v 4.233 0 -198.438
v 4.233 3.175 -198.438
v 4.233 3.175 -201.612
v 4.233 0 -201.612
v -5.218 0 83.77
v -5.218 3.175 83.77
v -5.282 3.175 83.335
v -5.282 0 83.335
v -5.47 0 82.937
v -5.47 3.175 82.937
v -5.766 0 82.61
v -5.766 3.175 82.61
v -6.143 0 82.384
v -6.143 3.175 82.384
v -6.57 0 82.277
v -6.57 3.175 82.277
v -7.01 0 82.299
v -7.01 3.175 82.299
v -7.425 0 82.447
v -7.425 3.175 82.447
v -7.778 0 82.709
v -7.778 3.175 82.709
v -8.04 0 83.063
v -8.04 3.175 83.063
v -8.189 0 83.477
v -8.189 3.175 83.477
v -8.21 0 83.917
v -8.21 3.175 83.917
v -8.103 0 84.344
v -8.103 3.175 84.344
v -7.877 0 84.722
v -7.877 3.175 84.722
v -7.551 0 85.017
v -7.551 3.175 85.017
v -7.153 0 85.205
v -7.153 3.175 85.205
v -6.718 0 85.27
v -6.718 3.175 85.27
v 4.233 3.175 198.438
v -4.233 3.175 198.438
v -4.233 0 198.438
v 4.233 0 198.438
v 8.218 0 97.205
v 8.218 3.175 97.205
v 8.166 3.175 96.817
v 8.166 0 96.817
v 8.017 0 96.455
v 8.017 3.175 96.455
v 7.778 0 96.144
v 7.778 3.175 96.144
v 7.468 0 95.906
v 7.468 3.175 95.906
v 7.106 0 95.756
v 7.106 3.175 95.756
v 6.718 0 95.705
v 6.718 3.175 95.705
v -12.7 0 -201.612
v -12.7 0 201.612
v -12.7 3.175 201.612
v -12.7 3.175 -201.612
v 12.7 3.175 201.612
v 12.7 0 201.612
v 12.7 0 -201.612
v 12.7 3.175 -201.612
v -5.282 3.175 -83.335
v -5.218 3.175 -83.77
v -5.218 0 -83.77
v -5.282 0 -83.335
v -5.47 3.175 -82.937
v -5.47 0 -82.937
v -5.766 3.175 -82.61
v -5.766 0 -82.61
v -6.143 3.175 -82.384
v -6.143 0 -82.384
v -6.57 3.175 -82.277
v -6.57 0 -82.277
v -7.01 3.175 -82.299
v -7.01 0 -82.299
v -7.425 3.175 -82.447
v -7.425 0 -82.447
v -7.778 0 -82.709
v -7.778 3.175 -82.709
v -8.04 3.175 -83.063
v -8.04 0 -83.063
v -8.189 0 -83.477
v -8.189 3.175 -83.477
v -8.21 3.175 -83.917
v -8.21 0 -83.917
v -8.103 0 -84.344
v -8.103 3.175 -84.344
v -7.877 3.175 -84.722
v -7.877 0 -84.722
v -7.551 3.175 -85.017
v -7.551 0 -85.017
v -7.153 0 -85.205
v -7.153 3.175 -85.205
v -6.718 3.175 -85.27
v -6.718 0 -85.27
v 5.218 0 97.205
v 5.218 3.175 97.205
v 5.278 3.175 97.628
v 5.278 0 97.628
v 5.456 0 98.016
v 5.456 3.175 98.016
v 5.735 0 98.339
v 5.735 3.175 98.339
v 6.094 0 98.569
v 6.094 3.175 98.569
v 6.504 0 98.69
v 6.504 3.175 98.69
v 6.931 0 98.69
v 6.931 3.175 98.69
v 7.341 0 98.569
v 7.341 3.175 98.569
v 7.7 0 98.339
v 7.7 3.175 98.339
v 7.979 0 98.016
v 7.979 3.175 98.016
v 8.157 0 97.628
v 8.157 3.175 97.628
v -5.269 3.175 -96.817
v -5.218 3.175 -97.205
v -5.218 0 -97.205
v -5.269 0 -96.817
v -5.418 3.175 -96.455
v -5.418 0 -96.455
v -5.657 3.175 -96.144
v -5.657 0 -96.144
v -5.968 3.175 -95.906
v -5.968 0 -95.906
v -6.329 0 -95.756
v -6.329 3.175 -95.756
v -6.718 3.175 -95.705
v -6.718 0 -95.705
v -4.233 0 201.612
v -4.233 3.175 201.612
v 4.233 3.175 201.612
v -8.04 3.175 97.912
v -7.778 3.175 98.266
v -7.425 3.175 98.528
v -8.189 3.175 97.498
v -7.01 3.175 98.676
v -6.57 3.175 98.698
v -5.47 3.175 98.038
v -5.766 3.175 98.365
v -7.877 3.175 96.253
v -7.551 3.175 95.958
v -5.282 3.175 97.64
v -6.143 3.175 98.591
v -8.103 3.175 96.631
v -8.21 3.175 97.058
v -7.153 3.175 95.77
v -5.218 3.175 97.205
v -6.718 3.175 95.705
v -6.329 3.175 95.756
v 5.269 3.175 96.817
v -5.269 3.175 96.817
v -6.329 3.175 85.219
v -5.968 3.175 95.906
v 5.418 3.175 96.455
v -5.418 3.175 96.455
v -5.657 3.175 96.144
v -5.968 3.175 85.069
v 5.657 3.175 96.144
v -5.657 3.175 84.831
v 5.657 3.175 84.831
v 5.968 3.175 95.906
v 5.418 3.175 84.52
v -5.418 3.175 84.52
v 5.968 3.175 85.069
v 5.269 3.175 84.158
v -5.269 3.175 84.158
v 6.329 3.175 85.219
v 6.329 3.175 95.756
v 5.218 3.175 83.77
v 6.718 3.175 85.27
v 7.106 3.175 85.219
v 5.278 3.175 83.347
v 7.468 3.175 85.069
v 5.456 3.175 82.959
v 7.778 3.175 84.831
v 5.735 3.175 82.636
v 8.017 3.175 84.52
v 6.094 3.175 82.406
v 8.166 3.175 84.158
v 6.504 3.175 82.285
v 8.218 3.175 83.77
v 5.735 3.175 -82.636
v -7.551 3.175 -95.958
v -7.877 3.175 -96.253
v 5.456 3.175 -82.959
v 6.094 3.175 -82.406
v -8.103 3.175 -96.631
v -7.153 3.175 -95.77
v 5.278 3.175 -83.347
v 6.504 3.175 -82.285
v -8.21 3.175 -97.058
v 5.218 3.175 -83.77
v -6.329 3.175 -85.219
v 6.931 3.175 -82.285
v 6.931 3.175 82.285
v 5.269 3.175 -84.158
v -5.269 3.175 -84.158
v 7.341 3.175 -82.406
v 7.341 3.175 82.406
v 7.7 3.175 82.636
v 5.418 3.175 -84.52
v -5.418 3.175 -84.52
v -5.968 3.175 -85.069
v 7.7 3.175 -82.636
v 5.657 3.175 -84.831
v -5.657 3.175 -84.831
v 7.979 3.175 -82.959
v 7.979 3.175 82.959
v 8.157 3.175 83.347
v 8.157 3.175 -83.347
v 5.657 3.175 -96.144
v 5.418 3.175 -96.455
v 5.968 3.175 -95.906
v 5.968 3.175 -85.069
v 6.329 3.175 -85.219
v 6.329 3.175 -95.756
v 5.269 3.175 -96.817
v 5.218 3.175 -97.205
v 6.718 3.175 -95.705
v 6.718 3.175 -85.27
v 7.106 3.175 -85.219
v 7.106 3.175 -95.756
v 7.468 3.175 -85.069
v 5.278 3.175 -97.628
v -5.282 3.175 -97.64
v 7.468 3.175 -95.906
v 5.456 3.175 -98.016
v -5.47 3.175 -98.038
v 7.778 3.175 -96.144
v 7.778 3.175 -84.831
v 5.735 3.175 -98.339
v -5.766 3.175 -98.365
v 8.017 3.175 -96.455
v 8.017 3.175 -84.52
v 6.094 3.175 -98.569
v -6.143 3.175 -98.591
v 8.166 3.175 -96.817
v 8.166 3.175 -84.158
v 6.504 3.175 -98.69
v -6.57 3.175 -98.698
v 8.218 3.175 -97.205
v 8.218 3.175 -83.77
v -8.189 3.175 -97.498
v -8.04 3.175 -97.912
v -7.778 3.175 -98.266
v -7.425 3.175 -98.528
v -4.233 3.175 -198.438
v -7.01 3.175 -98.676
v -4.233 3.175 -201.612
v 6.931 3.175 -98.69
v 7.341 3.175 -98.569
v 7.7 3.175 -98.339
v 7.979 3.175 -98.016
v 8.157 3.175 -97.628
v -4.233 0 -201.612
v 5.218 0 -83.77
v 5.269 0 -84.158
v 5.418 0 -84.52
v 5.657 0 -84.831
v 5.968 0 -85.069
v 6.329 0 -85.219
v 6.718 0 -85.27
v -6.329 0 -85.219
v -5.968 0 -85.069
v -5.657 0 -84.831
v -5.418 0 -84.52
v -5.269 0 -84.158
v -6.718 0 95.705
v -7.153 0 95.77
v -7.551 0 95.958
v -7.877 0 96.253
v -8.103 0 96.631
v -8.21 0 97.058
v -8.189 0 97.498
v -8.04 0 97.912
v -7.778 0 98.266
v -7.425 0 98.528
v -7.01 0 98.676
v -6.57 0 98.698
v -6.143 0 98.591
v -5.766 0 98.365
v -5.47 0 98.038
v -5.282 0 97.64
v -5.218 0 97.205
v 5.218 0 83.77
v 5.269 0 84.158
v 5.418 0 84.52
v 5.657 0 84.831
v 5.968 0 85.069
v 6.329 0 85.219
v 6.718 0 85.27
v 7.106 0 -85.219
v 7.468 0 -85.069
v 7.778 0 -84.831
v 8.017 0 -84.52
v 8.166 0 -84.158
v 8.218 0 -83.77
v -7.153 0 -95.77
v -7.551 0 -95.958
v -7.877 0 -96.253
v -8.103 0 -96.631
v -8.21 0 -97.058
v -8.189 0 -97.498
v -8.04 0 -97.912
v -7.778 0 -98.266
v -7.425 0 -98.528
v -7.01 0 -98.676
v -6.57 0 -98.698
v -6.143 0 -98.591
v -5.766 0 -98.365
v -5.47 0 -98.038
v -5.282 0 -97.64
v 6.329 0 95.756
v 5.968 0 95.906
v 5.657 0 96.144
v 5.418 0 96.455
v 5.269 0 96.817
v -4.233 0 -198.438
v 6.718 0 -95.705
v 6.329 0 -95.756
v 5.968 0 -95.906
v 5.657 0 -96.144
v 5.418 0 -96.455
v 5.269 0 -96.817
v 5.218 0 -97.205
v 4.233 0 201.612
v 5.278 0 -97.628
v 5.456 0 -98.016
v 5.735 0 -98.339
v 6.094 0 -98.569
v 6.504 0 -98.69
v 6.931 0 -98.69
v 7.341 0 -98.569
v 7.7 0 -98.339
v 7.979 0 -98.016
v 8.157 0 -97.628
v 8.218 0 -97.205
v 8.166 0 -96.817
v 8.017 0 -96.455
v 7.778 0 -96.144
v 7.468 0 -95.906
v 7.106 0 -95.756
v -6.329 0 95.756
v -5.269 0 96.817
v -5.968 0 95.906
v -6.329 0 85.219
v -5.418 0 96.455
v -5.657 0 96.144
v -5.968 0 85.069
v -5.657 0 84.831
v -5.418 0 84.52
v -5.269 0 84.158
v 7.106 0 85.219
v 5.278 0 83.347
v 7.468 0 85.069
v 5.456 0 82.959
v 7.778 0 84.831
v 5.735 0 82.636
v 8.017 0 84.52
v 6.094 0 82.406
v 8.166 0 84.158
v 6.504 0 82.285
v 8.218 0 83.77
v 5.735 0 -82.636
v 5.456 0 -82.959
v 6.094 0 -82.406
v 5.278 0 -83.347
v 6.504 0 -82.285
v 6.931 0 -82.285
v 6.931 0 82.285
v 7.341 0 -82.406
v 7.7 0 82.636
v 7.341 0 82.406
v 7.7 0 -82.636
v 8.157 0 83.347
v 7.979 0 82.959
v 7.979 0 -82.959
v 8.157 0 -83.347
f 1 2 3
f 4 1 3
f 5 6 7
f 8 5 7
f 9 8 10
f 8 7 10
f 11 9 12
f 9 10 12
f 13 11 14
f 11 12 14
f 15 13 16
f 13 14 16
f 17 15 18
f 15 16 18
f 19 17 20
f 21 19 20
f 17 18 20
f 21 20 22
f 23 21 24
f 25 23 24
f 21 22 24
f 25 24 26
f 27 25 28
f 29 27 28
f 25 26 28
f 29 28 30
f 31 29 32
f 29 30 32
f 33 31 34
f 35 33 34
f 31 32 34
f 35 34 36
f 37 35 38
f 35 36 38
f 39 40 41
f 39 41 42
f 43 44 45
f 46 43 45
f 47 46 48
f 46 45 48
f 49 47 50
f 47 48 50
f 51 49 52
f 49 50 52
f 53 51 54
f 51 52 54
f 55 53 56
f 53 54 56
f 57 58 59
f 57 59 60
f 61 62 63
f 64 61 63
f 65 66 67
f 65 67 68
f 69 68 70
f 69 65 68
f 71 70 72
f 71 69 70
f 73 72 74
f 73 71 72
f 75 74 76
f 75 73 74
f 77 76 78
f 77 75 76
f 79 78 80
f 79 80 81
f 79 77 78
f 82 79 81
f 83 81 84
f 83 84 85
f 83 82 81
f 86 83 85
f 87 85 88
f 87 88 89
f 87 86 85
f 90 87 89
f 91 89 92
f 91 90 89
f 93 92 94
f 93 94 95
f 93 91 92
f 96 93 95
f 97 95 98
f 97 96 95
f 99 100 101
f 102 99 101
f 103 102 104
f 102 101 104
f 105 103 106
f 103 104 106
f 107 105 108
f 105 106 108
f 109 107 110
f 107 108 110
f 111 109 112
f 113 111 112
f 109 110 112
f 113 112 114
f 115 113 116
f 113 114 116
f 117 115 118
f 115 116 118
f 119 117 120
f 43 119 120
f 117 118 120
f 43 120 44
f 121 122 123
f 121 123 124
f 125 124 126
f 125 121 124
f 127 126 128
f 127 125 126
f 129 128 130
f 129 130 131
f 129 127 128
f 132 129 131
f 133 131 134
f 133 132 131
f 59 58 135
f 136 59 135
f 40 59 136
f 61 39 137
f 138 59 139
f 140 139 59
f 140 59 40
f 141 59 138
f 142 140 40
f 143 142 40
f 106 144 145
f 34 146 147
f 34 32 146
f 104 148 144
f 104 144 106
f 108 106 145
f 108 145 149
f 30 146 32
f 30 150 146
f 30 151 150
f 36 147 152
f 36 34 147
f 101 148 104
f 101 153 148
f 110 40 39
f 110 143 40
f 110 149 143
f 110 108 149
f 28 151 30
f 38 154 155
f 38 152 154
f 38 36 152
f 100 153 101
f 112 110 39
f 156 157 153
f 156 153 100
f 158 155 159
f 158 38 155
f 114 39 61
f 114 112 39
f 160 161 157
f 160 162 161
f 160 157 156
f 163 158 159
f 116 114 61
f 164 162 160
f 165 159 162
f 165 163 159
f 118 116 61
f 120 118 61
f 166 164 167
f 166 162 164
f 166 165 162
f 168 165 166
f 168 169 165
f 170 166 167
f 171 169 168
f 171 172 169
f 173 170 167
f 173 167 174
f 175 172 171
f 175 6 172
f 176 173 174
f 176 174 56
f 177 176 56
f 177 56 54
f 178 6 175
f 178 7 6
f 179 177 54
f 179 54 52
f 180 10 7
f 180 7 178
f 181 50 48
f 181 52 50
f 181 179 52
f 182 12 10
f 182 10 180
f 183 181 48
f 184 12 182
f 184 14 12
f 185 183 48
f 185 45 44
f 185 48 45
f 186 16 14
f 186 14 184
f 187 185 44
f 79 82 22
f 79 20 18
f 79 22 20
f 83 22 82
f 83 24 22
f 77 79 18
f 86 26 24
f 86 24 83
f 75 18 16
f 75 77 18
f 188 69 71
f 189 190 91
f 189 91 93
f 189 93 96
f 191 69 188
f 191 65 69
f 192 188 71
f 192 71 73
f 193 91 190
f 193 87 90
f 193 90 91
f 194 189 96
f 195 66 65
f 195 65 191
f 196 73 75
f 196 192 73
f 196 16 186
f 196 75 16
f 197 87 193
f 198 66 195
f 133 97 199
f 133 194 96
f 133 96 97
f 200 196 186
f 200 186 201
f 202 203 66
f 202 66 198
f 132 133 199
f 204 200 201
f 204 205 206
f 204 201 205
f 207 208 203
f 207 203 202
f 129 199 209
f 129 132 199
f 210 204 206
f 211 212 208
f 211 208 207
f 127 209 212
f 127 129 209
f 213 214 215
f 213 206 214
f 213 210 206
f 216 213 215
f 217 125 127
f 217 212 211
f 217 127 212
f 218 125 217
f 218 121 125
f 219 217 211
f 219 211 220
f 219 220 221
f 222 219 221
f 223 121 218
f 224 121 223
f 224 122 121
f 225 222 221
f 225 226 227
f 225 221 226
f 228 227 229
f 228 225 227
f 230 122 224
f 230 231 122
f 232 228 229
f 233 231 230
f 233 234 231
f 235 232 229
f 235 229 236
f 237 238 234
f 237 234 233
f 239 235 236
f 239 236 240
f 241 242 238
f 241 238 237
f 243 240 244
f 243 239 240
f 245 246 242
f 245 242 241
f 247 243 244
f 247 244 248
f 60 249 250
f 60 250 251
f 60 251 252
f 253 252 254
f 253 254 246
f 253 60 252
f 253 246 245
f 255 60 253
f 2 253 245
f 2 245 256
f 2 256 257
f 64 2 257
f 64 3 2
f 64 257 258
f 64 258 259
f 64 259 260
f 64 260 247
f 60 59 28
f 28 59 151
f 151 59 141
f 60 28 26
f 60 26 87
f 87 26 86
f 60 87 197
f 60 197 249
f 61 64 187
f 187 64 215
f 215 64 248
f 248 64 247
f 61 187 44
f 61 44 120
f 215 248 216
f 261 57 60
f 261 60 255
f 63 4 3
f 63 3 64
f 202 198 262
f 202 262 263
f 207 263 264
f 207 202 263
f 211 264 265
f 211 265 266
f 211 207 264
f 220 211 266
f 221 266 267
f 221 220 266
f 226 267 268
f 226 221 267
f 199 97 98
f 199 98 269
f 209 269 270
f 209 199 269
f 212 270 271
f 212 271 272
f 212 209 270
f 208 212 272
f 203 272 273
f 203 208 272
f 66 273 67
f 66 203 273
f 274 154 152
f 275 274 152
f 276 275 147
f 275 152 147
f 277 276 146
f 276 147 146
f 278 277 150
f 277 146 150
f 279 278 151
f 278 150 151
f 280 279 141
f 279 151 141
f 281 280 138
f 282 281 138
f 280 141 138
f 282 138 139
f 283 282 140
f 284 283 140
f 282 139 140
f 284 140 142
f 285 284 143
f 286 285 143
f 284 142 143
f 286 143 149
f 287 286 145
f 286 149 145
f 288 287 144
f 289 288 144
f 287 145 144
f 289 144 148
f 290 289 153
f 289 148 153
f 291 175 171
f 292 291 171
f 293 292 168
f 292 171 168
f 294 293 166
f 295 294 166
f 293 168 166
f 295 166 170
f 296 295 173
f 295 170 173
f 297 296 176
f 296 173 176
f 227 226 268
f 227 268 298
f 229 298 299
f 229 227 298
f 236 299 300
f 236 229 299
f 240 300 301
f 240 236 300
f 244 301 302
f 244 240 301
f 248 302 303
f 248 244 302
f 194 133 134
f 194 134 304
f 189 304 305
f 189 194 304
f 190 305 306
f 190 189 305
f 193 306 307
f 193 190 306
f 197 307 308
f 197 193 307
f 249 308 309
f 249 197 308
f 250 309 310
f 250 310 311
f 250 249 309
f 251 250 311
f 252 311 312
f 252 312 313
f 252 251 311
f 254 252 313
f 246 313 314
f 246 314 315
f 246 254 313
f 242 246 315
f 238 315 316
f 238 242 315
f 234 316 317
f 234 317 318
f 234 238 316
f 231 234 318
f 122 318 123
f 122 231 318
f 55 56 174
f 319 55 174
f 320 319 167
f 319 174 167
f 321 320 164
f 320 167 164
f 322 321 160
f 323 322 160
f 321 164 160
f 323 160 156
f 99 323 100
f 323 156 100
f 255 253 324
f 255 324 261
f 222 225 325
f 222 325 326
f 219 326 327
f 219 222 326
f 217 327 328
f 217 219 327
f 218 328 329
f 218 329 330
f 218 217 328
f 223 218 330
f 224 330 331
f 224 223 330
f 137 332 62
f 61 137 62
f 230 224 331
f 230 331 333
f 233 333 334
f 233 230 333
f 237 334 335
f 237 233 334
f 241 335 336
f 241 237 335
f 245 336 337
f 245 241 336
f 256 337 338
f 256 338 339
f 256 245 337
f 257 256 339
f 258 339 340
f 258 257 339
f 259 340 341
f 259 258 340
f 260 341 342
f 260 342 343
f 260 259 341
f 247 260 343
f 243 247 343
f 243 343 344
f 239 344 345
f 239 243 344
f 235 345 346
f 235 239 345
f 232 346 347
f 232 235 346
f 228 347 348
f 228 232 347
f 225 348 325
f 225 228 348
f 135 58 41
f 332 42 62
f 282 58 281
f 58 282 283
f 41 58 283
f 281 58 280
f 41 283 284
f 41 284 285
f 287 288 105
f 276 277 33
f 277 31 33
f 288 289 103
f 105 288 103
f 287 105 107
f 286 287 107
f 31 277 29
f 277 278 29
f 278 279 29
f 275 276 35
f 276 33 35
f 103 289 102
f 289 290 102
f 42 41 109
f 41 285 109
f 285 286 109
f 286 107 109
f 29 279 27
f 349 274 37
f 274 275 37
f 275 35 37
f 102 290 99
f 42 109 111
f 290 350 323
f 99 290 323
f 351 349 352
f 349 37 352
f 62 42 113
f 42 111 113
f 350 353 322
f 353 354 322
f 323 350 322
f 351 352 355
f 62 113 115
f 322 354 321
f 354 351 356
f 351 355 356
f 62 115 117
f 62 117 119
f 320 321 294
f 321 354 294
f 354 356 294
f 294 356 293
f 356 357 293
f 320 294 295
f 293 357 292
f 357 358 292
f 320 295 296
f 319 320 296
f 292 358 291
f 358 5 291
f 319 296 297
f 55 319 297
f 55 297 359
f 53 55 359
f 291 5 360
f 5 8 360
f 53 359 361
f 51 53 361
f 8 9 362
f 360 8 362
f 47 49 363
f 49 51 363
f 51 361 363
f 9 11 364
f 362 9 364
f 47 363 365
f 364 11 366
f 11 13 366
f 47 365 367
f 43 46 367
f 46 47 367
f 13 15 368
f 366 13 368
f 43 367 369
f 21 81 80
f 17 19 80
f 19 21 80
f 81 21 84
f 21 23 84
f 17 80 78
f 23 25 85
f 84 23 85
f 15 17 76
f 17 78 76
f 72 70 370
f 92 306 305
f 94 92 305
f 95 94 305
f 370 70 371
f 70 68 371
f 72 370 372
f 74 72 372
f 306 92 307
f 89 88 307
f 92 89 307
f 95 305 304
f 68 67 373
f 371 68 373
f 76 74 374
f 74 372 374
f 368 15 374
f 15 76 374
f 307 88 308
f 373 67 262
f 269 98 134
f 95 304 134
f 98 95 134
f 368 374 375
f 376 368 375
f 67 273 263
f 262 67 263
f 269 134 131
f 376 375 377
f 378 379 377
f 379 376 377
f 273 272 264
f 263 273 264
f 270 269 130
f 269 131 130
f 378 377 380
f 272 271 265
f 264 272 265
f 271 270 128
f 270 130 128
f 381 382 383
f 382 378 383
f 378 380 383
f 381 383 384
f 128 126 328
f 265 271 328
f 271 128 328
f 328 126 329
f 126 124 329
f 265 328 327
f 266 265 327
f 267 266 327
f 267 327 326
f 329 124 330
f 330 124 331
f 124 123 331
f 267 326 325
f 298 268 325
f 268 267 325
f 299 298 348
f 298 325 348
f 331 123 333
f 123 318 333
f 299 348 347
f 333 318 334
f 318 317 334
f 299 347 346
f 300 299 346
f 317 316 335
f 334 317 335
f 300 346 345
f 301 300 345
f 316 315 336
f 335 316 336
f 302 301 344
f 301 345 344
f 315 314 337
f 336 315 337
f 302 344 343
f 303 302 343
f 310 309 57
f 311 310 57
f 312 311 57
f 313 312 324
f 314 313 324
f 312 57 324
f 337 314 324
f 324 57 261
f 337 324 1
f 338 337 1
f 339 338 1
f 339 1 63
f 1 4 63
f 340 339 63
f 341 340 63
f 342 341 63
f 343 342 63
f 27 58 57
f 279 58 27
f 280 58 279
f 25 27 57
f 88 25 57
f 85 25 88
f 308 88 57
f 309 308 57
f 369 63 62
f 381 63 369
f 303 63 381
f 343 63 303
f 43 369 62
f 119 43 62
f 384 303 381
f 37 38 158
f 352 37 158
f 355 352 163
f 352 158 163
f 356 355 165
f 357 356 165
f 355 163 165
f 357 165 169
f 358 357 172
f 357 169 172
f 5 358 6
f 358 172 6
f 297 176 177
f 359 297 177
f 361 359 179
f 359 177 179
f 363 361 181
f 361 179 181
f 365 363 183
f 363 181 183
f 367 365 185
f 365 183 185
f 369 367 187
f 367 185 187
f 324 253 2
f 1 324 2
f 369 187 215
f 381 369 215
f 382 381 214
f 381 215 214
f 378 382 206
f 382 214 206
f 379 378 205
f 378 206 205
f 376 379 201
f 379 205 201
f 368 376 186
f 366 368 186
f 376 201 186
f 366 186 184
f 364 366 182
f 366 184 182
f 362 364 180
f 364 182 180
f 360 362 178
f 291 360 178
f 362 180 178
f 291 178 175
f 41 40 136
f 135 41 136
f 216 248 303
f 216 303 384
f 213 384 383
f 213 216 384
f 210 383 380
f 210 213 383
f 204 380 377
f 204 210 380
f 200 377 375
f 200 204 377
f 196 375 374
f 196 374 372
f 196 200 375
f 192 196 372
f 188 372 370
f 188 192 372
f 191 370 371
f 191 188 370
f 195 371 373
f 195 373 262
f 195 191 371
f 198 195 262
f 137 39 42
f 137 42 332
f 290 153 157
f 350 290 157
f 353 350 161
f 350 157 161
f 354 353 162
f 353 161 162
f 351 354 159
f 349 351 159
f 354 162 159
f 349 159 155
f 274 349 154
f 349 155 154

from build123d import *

# Parameters (mm, degrees)
SKETCH2_W           = 25.4
SKETCH2_H           = 403.225
BOSS_EXTRUDE1_DEPTH = 3.175
SKETCH3_W           = 8.466666666
SKETCH3_H           = 3.175
CUT_EXTRUDE1_DEPTH  = 3.175
CUT_EXTRUDE2_DEPTH  = 3.175


with BuildPart() as part:
    # Sketch2 → Boss-Extrude1 (new body)
    with BuildSketch(Plane(origin=(0, 0, 0), x_dir=(1, 0, 0), z_dir=(0, 1, 0))):
        Rectangle(SKETCH2_W, SKETCH2_H)
    extrude(amount=BOSS_EXTRUDE1_DEPTH)

    # Sketch3 → Cut-Extrude1 (cut)
    with BuildSketch(Plane(origin=(0, 3.175, 0), x_dir=(1, 0, 0), z_dir=(0, 1, 0))):
        with Locations((0, 200.025)):
            Rectangle(SKETCH3_W, SKETCH3_H)
    cut_extrude1 = extrude(amount=-CUT_EXTRUDE1_DEPTH, mode=Mode.SUBTRACT)

    # Mirror1: Cut-Extrude1 across plane
    add(cut_extrude1.mirror(Plane.XY), mode=Mode.SUBTRACT)

    # Sketch5 → Cut-Extrude2 (cut)
    with BuildSketch(Plane(origin=(0, 3.175, 0), x_dir=(1, 0, 0), z_dir=(0, 1, 0))):
        with BuildLine():
            ThreePointArc((8.217514421, -83.769985579), (6.717514421, -82.269985579), (5.217514421, -83.769985579))
            Line((5.217514421, -83.769985579), (6.717514421, -83.769985579))
            Line((6.717514421, -83.769985579), (6.717514421, -85.269985579))
            ThreePointArc((6.717514421, -85.269985579), (7.778174593, -84.830645751), (8.217514421, -83.769985579))
        make_face()
        with BuildLine():
            Line((6.717514421, -83.769985579), (5.217514421, -83.769985579))
            ThreePointArc((5.217514421, -83.769985579), (5.656854249, -84.830645751), (6.717514421, -85.269985579))
            Line((6.717514421, -85.269985579), (6.717514421, -83.769985579))
        make_face()
        with BuildLine():
            Line((-6.717514421, -85.269985579), (-6.717514421, -83.769985579))
            Line((-6.717514421, -83.769985579), (-5.217514421, -83.769985579))
            ThreePointArc((-5.217514421, -83.769985579), (-7.778174593, -82.709325407), (-6.717514421, -85.269985579))
        make_face()
        with BuildLine():
            Line((-5.217514421, -83.769985579), (-6.717514421, -83.769985579))
            Line((-6.717514421, -83.769985579), (-6.717514421, -85.269985579))
            ThreePointArc((-6.717514421, -85.269985579), (-5.656854249, -84.830645751), (-5.217514421, -83.769985579))
        make_face()
        with BuildLine():
            ThreePointArc((-5.217514421, -97.205014421), (-5.656854249, -96.144354249), (-6.717514421, -95.705014421))
            Line((-6.717514421, -95.705014421), (-6.717514421, -97.205014421))
            Line((-6.717514421, -97.205014421), (-5.217514421, -97.205014421))
        make_face()
        with BuildLine():
            Line((-6.717514421, -97.205014421), (-6.717514421, -95.705014421))
            ThreePointArc((-6.717514421, -95.705014421), (-7.778174593, -98.265674593), (-5.217514421, -97.205014421))
            Line((-5.217514421, -97.205014421), (-6.717514421, -97.205014421))
        make_face()
        with BuildLine():
            ThreePointArc((8.217514421, -97.205014421), (7.778174593, -96.144354249), (6.717514421, -95.705014421))
            Line((6.717514421, -95.705014421), (6.717514421, -97.205014421))
            Line((6.717514421, -97.205014421), (5.217514421, -97.205014421))
            ThreePointArc((5.217514421, -97.205014421), (6.717514421, -98.705014421), (8.217514421, -97.205014421))
        make_face()
        with BuildLine():
            Line((6.717514421, -97.205014421), (6.717514421, -95.705014421))
            ThreePointArc((6.717514421, -95.705014421), (5.656854249, -96.144354249), (5.217514421, -97.205014421))
            Line((5.217514421, -97.205014421), (6.717514421, -97.205014421))
        make_face()
    cut_extrude2 = extrude(amount=-CUT_EXTRUDE2_DEPTH, mode=Mode.SUBTRACT)

    # Mirror2: Cut-Extrude2 across plane
    add(cut_extrude2.mirror(Plane.XY), mode=Mode.SUBTRACT)


solid = part.part
